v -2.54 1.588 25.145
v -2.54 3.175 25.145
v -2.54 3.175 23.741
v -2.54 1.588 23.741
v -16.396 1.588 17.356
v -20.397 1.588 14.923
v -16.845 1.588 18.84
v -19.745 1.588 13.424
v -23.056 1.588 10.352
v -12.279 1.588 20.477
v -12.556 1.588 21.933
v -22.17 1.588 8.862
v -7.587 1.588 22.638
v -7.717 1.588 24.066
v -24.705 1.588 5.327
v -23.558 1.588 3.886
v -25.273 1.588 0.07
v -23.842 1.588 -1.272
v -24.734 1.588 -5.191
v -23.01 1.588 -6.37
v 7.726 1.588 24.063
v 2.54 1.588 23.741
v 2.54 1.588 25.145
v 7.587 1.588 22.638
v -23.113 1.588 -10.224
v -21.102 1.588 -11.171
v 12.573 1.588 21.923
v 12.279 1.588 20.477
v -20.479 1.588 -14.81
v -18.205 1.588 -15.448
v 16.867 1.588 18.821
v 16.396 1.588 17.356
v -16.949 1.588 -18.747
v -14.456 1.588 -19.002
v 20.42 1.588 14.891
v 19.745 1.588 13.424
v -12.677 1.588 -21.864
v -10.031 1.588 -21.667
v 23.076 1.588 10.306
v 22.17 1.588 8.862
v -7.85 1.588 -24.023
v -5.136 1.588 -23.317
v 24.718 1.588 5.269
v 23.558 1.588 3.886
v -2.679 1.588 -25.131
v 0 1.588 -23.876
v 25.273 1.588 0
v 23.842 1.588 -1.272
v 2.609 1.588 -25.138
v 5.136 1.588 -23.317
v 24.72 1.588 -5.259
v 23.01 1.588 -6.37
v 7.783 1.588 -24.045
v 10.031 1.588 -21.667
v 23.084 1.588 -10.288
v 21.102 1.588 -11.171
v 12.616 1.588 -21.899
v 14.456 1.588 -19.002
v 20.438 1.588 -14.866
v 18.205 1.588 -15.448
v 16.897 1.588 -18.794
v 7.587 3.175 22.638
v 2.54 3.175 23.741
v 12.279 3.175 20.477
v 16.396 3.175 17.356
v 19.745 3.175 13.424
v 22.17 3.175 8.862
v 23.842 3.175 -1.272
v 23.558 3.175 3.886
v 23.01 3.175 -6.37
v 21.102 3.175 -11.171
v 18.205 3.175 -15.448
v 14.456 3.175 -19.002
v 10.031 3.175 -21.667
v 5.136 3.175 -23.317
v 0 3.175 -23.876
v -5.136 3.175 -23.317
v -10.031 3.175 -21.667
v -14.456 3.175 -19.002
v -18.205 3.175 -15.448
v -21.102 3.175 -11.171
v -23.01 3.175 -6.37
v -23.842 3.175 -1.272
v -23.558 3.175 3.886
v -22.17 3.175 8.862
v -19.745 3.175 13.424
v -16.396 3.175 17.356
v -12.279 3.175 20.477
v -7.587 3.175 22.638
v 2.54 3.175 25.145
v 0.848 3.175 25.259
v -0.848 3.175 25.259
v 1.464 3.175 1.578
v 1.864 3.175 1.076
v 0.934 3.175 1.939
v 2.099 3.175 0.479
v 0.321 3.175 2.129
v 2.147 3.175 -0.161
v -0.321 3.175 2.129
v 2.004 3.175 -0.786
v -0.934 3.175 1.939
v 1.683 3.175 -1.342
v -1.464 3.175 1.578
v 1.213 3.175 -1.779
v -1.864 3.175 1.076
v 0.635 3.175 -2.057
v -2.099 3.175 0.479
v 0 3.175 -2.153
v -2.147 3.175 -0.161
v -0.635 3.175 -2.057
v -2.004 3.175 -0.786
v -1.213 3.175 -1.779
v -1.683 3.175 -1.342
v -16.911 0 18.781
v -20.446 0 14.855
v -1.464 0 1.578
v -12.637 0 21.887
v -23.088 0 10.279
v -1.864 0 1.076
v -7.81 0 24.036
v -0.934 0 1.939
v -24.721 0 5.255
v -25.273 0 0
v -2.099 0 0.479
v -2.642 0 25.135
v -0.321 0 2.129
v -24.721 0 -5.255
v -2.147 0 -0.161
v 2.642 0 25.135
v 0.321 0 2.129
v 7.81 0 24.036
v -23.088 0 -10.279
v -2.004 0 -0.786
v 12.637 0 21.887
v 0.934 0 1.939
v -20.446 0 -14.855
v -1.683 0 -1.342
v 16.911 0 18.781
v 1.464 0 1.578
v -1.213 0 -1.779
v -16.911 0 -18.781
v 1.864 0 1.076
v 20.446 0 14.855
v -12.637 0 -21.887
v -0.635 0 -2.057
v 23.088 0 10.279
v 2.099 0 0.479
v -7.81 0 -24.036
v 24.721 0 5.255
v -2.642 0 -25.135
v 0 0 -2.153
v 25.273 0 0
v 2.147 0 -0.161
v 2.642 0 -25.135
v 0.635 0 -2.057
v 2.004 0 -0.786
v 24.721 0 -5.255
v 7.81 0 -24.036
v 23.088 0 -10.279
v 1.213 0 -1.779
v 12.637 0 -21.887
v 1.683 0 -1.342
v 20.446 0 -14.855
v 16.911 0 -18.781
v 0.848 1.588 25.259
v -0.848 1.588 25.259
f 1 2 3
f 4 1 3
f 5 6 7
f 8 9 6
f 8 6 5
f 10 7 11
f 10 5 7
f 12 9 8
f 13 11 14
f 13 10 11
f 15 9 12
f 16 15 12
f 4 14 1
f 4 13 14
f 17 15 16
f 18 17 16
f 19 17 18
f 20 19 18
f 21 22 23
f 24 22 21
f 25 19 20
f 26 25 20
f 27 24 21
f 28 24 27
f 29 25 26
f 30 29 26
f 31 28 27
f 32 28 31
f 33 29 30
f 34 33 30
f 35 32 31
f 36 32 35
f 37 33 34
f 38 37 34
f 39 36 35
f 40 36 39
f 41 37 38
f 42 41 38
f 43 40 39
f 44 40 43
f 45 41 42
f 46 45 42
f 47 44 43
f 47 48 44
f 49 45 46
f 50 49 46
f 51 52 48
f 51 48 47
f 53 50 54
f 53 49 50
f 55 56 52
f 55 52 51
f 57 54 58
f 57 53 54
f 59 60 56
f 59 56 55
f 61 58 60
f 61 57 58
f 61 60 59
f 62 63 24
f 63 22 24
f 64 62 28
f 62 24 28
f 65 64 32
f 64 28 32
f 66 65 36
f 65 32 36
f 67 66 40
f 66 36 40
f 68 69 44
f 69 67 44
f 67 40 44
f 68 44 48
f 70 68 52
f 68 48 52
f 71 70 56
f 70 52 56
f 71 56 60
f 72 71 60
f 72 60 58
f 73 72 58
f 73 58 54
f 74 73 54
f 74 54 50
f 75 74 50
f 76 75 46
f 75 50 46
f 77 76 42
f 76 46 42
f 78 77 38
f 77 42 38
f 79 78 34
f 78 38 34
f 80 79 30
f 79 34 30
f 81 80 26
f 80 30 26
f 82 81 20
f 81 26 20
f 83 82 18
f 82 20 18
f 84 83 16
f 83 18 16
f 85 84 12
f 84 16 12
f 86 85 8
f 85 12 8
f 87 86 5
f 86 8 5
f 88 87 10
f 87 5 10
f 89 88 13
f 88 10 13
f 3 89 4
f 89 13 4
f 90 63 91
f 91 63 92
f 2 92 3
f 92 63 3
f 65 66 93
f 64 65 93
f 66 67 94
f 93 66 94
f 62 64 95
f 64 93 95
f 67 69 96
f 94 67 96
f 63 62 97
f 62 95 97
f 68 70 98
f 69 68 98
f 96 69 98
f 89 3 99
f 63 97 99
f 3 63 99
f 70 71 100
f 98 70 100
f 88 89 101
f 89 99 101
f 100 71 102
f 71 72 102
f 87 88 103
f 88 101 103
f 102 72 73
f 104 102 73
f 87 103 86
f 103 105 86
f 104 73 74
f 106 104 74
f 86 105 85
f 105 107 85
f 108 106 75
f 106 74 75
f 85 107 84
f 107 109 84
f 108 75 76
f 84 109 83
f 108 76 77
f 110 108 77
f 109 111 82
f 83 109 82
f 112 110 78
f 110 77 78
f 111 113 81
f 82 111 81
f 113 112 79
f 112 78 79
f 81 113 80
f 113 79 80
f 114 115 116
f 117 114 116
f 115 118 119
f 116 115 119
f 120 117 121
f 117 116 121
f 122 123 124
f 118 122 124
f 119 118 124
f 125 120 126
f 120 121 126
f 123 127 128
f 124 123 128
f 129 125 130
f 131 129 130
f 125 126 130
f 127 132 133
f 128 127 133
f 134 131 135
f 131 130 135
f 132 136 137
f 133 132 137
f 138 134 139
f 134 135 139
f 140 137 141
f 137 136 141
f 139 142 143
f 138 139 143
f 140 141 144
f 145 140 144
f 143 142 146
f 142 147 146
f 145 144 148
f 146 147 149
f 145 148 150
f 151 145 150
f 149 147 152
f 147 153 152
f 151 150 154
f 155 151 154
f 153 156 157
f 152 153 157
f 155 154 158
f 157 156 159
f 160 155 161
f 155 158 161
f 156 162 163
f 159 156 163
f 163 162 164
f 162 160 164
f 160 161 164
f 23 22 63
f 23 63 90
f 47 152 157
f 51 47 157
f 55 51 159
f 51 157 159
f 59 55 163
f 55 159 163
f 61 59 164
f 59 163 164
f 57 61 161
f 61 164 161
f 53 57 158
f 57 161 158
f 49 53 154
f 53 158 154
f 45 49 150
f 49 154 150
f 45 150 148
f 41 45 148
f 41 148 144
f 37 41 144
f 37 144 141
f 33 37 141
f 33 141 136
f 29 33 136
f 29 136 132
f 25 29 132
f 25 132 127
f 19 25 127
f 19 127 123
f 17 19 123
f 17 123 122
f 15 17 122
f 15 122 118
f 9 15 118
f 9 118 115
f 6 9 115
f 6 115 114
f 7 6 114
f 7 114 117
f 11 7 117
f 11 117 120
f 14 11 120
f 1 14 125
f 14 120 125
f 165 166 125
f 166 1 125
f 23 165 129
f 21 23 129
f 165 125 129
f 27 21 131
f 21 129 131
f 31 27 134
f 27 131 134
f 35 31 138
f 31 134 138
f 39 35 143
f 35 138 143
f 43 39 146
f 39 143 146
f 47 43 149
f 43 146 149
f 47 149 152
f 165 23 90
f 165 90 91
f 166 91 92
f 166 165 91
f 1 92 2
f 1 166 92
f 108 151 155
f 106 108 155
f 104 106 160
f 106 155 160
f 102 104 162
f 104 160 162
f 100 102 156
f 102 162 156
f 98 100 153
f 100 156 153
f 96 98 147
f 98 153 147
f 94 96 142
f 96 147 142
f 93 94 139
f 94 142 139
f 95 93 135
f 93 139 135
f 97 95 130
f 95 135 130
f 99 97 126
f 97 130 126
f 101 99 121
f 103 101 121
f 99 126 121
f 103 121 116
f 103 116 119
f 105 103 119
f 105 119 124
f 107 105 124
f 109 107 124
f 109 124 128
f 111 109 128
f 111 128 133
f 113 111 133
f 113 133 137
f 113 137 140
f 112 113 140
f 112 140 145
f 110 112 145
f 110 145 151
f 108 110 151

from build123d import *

# Parameters (mm, degrees)
SKETCH1_R                 = 25.273
BOSS_EXTRUDE1_DEPTH       = 1.5875
SKETCH2_R                 = 23.876
BOSS_EXTRUDE2_DEPTH       = 1.5875
BOSS_EXTRUDE3_DEPTH       = 1.5875
F_8_CLEARANCE_HOLE1_D     = 4.3053
F_8_CLEARANCE_HOLE1_DEPTH = 3.175


with BuildPart() as part:
    # Sketch1 → Boss-Extrude1 (new body)
    with BuildSketch(Plane(origin=(0, 0, 0), x_dir=(1, 0, 0), z_dir=(0, 1, 0))):
        Circle(SKETCH1_R)
    extrude(amount=BOSS_EXTRUDE1_DEPTH)

    # Sketch2 → Boss-Extrude2 (add)
    with BuildSketch(Plane(origin=(0, 1.5875, 0), x_dir=(1, 0, 0), z_dir=(0, 1, 0))):
        Circle(SKETCH2_R)
    extrude(amount=BOSS_EXTRUDE2_DEPTH)

    # Sketch3 → Boss-Extrude3 (add)
    with BuildSketch(Plane(origin=(0, 1.5875, 0), x_dir=(1, 0, 0), z_dir=(0, 1, 0))):
        with BuildLine():
            Line((-2.54, -25.14503786), (-2.54, -23.740509177))
            ThreePointArc((-2.54, -23.740509177), (0, -23.876), (2.54, -23.740509177))
            Line((2.54, -23.740509177), (2.54, -25.14503786))
            ThreePointArc((2.54, -25.14503786), (0, -25.273), (-2.54, -25.14503786))
        make_face()
    extrude(amount=BOSS_EXTRUDE3_DEPTH)

    # #8 Clearance Hole1
    with Locations(Plane.ZX.offset(3.175)):
        with Locations((0, 0)):
            Hole(F_8_CLEARANCE_HOLE1_D / 2, depth=F_8_CLEARANCE_HOLE1_DEPTH)


solid = part.part
